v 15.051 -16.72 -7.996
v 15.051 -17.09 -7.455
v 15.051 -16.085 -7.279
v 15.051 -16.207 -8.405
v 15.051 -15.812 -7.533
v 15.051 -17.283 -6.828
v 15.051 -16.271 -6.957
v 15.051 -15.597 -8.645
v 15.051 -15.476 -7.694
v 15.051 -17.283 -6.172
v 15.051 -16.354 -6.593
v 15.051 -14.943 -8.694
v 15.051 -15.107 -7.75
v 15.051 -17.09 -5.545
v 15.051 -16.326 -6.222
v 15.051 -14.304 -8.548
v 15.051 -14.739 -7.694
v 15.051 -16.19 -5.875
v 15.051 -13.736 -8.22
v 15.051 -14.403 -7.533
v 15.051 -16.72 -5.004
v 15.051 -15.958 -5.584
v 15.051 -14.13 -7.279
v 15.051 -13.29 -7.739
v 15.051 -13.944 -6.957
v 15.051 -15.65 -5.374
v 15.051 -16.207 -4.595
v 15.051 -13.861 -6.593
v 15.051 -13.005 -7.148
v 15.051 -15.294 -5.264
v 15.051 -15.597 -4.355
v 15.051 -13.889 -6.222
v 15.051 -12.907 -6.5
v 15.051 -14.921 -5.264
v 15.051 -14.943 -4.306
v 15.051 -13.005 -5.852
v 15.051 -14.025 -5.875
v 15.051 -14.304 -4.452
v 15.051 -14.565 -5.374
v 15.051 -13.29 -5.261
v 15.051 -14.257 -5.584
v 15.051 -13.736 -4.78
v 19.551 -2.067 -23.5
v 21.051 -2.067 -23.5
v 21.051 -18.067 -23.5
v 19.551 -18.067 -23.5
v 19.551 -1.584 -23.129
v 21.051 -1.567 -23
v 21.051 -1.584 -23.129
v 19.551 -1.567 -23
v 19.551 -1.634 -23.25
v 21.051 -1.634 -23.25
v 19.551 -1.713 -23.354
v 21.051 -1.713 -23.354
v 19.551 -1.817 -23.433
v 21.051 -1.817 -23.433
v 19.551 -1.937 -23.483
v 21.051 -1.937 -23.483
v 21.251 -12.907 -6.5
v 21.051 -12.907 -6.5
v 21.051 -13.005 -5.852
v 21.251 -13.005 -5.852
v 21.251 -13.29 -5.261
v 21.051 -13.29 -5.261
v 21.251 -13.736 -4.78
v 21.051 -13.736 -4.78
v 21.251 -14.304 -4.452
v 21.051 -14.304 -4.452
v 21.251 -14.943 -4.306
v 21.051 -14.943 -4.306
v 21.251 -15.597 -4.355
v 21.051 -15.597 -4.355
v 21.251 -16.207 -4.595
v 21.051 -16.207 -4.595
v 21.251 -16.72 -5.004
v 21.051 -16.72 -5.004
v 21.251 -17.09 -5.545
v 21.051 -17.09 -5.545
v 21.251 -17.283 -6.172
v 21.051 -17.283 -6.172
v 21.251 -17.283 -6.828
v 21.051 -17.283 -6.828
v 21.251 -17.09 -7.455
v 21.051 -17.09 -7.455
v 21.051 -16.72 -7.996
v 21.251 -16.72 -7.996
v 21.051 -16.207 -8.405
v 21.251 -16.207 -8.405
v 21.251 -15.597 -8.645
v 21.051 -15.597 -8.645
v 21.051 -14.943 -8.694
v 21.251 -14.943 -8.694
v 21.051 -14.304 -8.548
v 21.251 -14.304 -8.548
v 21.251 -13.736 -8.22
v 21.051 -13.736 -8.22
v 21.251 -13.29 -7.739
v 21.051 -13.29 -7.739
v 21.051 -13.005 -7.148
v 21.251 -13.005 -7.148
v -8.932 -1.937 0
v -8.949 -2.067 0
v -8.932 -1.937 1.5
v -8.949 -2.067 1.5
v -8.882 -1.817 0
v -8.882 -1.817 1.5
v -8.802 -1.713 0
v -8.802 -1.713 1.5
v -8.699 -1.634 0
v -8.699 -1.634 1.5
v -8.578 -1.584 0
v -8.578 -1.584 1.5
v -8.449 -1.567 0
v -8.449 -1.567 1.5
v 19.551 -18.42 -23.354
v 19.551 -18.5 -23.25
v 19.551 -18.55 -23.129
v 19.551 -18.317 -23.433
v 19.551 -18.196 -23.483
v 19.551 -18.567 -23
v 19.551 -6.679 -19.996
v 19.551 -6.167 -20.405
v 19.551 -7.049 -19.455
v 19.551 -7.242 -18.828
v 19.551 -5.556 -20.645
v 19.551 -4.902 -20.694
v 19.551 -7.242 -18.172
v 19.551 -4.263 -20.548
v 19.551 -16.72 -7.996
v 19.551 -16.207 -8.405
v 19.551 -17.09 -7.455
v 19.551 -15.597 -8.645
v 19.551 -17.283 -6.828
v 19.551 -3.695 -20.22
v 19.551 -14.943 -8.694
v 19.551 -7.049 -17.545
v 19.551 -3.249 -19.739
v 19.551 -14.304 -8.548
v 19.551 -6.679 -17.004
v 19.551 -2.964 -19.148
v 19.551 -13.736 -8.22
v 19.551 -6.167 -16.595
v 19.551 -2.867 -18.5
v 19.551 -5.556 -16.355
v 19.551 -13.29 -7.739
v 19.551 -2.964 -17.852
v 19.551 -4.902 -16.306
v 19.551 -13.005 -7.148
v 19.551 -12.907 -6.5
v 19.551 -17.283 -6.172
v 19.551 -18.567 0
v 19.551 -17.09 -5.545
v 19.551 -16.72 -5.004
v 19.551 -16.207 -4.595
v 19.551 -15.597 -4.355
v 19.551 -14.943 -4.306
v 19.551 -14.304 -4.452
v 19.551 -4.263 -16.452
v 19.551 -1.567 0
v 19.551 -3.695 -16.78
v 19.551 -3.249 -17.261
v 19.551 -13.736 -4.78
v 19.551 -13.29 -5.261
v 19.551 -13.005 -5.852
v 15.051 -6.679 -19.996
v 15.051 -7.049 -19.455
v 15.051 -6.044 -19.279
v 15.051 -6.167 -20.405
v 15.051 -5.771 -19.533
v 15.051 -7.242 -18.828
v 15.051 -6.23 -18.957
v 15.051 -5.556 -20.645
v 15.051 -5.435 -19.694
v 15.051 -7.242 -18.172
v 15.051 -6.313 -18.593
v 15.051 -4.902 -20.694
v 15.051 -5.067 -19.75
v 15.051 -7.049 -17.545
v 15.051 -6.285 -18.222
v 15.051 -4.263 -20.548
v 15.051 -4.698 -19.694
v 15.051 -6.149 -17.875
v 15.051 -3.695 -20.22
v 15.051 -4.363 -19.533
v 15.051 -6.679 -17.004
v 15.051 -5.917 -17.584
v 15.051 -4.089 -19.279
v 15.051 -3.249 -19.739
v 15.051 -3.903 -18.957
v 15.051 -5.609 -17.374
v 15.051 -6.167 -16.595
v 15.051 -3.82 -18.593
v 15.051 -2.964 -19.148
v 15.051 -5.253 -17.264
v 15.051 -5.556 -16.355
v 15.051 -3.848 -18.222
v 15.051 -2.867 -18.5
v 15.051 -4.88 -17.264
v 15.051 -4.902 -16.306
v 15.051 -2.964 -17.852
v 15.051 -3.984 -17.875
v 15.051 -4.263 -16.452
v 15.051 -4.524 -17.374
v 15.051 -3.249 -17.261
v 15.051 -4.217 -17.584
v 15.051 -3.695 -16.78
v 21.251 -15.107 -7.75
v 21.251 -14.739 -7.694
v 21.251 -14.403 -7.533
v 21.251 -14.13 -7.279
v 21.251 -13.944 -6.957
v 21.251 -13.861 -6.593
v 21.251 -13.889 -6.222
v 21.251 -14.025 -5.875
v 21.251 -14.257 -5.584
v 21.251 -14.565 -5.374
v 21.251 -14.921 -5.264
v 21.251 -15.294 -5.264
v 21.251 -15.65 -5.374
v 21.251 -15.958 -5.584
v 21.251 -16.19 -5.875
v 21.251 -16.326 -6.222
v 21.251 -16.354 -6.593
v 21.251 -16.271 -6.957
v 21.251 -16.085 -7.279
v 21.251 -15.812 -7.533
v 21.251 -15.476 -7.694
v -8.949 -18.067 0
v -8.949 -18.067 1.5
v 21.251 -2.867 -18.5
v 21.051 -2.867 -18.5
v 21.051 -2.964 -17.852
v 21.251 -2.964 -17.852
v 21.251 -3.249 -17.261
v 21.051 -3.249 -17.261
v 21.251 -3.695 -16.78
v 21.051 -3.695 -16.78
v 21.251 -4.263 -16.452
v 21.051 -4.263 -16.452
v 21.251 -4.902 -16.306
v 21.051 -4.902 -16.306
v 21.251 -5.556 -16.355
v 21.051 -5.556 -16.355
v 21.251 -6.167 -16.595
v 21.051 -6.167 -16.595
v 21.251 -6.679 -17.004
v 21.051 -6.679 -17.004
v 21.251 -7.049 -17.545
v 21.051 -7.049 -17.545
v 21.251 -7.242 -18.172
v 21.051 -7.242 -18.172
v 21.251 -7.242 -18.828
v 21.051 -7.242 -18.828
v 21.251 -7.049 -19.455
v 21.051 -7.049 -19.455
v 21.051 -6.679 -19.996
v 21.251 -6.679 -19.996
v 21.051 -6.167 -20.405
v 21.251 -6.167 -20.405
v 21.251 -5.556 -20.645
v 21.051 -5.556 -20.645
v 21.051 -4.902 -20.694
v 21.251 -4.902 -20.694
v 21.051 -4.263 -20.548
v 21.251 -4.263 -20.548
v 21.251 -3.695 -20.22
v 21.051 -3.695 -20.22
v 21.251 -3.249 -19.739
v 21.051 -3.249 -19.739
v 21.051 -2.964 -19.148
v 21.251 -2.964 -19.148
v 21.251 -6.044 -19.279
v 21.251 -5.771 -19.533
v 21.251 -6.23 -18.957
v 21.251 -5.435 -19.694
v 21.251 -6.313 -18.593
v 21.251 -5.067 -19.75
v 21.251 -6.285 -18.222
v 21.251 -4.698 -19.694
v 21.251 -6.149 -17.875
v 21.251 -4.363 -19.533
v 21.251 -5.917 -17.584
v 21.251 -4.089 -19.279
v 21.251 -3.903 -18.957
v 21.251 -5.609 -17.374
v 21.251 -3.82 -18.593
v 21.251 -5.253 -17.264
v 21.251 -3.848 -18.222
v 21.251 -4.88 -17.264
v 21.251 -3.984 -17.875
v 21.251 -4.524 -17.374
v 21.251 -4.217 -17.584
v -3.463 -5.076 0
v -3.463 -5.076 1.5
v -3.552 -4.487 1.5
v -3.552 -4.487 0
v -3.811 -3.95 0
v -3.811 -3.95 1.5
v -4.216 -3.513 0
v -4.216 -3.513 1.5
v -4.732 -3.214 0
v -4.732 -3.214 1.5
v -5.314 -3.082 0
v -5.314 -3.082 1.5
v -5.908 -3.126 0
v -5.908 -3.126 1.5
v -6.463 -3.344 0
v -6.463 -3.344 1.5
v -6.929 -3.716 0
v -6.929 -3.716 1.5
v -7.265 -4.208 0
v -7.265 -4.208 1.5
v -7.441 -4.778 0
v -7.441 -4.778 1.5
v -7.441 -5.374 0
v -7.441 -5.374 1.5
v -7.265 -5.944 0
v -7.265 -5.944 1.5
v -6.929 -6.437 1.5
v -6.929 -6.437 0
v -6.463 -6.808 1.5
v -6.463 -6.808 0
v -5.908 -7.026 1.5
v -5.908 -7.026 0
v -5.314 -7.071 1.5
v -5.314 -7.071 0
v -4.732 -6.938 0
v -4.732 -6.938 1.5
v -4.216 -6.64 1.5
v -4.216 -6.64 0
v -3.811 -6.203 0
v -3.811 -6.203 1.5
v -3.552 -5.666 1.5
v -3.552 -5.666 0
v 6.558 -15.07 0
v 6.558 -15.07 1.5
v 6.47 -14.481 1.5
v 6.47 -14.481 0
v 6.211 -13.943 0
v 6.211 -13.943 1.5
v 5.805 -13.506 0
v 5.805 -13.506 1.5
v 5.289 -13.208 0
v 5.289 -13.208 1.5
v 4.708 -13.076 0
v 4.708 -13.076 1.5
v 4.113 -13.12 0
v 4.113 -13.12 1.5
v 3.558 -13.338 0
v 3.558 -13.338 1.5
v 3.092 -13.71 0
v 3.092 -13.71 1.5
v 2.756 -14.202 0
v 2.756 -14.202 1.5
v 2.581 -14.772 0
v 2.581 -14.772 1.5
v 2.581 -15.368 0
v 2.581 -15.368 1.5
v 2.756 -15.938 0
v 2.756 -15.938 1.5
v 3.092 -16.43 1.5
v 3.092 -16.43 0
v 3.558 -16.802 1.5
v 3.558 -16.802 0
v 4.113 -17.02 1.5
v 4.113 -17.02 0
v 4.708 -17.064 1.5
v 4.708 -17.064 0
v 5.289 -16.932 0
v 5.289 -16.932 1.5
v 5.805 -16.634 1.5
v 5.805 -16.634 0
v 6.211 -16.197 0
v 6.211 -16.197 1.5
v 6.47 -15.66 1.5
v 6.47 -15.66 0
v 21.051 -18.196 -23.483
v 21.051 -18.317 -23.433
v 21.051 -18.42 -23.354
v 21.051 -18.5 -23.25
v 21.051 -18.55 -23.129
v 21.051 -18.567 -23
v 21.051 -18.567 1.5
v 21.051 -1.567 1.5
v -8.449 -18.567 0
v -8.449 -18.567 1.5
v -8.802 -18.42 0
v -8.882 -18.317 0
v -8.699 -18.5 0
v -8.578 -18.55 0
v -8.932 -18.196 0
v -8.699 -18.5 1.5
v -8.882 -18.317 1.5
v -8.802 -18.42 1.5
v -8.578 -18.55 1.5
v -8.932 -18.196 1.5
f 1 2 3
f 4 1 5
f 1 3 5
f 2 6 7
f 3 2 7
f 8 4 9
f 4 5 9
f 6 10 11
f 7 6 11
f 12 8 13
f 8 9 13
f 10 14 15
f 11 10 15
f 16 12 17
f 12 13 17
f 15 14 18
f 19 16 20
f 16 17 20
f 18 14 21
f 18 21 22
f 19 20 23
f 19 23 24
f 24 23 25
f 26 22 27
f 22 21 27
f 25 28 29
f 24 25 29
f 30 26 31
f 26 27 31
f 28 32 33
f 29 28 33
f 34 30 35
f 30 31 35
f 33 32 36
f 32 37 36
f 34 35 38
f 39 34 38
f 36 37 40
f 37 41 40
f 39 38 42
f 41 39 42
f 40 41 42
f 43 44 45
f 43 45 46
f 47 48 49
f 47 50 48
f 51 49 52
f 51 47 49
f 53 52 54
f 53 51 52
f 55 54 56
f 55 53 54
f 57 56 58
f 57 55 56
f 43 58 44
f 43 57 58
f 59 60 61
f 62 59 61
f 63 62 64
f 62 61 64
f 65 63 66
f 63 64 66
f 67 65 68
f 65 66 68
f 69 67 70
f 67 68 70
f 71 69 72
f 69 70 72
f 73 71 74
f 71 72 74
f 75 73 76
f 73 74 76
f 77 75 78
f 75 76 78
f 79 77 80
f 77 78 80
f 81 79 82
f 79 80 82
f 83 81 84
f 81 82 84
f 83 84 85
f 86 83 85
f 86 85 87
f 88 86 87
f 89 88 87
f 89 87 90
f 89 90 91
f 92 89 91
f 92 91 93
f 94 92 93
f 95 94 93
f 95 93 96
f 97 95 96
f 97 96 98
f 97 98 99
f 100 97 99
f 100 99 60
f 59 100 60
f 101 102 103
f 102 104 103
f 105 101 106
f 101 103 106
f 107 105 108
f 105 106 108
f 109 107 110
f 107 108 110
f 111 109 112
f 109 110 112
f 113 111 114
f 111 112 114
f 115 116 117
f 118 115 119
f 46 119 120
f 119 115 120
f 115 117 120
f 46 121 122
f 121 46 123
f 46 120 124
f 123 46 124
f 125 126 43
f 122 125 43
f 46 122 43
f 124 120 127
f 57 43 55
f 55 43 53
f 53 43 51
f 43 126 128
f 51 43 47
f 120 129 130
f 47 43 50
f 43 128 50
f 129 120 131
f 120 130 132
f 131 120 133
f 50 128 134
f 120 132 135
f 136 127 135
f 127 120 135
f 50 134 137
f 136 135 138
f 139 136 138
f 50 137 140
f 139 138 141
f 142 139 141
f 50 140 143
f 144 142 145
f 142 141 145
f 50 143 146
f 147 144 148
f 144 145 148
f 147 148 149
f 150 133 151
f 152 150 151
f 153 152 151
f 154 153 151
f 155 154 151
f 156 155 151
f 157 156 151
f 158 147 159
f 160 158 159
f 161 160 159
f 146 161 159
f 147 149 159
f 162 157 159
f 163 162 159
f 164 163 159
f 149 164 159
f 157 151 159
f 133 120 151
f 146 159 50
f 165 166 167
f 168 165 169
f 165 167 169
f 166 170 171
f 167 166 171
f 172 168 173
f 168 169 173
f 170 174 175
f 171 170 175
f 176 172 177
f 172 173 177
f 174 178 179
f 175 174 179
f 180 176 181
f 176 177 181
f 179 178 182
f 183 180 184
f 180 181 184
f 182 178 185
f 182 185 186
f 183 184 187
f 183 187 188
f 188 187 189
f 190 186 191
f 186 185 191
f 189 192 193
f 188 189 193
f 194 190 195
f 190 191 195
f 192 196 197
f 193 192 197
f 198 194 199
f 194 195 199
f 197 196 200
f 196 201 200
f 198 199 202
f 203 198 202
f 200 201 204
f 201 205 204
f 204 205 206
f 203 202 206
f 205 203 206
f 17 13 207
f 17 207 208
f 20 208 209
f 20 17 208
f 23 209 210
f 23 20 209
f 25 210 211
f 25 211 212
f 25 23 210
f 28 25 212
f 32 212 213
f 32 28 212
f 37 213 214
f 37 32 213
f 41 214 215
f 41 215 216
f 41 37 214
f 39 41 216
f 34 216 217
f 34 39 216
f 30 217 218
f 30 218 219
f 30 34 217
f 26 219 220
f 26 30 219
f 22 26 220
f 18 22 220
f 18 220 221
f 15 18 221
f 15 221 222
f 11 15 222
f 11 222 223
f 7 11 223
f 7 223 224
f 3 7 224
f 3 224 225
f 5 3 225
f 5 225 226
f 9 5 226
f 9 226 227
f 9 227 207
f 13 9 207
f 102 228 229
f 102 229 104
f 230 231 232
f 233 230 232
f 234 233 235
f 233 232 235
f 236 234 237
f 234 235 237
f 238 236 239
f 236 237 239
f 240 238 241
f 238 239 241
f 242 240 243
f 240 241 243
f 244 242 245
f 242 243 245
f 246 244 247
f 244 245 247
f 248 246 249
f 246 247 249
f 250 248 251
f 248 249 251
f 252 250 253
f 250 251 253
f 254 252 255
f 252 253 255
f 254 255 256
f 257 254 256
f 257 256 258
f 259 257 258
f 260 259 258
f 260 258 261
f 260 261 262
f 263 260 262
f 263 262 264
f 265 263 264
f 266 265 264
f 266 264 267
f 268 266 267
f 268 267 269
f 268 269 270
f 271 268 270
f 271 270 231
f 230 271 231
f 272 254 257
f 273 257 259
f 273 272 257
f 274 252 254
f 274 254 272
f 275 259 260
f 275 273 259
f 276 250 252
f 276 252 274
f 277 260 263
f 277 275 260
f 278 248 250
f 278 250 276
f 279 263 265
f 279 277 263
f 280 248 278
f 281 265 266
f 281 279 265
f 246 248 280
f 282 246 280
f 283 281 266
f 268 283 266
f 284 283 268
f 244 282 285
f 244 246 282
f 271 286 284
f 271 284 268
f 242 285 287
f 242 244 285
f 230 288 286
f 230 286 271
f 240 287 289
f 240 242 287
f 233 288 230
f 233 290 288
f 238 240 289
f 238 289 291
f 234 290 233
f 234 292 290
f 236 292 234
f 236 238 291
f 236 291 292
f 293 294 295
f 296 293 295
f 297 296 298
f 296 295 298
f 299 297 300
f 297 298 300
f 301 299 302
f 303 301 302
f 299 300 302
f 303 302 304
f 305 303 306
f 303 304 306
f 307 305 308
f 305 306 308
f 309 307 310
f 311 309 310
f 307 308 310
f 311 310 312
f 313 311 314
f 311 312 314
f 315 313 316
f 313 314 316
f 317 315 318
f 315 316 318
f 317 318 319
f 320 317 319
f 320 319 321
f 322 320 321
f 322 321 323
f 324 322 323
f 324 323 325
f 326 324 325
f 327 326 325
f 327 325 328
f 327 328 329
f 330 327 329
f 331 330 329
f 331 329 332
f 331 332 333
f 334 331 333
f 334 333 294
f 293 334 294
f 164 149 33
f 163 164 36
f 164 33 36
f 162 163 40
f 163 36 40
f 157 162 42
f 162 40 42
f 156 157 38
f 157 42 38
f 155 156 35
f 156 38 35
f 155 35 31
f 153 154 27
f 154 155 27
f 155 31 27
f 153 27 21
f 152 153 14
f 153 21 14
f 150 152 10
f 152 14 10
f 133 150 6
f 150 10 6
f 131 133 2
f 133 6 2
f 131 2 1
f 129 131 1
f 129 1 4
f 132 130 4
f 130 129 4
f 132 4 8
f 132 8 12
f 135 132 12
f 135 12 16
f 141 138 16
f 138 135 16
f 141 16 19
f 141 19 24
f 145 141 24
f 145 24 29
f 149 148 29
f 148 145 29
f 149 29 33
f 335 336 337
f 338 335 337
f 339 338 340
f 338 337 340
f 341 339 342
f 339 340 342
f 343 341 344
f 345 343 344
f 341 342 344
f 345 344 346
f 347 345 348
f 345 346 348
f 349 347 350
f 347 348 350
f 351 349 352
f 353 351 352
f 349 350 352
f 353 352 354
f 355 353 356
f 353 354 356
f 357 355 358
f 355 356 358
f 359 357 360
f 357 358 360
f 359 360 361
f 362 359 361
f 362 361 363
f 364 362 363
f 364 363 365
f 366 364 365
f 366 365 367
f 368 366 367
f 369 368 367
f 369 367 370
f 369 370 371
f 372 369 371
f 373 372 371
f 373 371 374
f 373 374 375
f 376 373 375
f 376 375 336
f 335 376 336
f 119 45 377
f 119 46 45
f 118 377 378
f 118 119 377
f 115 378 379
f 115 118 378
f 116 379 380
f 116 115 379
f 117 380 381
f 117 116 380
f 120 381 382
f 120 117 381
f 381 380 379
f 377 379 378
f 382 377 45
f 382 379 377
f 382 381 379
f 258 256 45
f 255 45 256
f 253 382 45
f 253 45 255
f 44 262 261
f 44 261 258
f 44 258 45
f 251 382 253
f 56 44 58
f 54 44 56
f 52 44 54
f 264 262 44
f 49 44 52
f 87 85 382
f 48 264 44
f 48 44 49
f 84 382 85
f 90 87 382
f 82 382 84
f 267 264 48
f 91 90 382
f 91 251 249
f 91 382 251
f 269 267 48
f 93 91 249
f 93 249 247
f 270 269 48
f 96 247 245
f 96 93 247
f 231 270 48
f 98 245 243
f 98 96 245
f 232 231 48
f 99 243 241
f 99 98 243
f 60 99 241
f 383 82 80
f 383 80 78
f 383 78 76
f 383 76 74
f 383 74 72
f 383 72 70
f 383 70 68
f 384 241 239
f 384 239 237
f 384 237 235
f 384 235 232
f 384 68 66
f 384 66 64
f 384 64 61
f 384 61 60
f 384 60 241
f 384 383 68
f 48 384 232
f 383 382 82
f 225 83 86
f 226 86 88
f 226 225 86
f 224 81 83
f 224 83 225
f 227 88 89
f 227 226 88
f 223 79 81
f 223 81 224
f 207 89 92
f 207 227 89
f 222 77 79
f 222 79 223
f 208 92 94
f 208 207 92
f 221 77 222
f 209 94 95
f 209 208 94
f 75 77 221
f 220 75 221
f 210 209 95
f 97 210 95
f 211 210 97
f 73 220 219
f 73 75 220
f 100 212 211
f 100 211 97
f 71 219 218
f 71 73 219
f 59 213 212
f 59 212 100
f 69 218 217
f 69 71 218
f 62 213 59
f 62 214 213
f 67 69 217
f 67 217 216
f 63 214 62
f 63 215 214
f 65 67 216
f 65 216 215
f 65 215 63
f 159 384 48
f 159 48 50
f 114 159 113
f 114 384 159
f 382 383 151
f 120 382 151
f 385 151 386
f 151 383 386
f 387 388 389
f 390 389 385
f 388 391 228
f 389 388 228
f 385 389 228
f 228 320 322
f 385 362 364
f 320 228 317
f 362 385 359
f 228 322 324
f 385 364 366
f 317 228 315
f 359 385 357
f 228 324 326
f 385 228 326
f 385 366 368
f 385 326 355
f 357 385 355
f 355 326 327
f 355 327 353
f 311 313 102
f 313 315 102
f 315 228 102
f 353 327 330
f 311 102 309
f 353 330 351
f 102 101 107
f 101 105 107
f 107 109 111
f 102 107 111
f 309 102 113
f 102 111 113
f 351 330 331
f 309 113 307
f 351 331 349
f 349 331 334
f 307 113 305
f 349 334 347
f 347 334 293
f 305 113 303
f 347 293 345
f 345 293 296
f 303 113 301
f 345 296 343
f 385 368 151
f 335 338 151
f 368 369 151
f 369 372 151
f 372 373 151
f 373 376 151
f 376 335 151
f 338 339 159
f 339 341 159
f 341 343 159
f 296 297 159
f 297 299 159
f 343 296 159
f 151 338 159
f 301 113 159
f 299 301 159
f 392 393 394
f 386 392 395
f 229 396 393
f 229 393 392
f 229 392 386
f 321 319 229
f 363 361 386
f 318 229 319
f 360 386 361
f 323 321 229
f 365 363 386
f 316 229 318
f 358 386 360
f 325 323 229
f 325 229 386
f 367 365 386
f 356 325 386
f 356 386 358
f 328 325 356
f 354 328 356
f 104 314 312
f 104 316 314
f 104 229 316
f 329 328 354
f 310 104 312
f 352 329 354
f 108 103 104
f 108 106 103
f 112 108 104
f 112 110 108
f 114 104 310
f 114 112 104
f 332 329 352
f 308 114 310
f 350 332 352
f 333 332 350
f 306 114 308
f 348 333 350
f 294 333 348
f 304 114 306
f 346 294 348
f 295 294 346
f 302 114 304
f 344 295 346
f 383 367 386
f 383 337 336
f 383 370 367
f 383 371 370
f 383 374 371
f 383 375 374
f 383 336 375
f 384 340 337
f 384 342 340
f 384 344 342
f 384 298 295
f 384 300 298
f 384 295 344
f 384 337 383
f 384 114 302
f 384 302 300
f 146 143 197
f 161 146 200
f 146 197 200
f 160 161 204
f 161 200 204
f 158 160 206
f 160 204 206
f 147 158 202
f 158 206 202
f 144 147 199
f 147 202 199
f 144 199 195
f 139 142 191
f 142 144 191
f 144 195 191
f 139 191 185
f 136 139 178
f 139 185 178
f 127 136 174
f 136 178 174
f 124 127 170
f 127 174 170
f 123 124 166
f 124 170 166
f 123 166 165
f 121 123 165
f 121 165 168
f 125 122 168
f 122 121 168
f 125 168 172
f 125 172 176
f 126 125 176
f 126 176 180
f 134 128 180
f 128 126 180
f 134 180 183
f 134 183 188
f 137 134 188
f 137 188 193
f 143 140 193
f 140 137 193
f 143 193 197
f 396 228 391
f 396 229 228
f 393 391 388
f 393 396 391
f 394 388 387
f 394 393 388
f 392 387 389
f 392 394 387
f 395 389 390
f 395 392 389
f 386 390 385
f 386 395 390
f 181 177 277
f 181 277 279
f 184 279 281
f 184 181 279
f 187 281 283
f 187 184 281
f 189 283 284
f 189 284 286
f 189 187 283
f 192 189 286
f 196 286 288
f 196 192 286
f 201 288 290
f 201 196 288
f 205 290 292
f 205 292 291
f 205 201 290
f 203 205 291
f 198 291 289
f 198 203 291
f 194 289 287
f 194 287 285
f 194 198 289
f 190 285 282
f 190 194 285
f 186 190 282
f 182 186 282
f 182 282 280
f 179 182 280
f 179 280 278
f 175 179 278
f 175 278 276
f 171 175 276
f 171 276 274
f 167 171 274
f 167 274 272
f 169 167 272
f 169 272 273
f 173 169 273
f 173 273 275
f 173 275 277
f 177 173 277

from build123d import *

# Parameters (mm, degrees)
ESQUISSE1_W             = 30
ESQUISSE1_H             = 17
EXTRUSION1_DEPTH        = 1.5
ESQUISSE2_R             = 2
ENL_V_MAT_EXTRU_1_DEPTH = 2
ESQUISSE3_W             = 1.5
ESQUISSE3_H             = 17
EXTRUSION2_DEPTH        = 23.5
ESQUISSE4_R             = 1.25
ENL_V_MAT_EXTRU_2_DEPTH = 2
EXTRUSION3_DEPTH        = 0.2
EXTRUSION3_DEPTH_BACK   = 6
ESQUISSE5_R             = 2.2
ESQUISSE5_R_2           = 1.25
CONG_1_R                = 0.5


with BuildPart() as part:
    # Esquisse1 → Extrusion1 (new body)
    with BuildSketch(Plane.XY):
        with Locations((6.051065449, -10.06674277)):
            Rectangle(ESQUISSE1_W, ESQUISSE1_H)
    extrude(amount=EXTRUSION1_DEPTH)

    # Esquisse2 → Enlèv. mat.-Extru.1 (cut)
    with BuildSketch(Plane.XY.offset(1.5)):
        with Locations((-5.463077382, -5.076163116)):
            Circle(ESQUISSE2_R)
        with Locations((4.558431294, -15.07006433)):
            Circle(ESQUISSE2_R)
    extrude(amount=-ENL_V_MAT_EXTRU_1_DEPTH, mode=Mode.SUBTRACT)

    # Esquisse3 → Extrusion2 (add)
    with BuildSketch(Plane(origin=(0, 0, 0), x_dir=(-1, 0, 0), z_dir=(0, 0, -1))):
        with Locations((-20.301065449, -10.06674277)):
            Rectangle(ESQUISSE3_W, ESQUISSE3_H)
    extrude(amount=EXTRUSION2_DEPTH)

    # Esquisse4 → Enlèv. mat.-Extru.2 (cut)
    with BuildSketch(Plane(origin=(21.051065449, 0, 0), x_dir=(0, 0, -1), z_dir=(1, 0, 0))):
        with Locations((6.5, -15.107440586)):
            Circle(ESQUISSE4_R)
        with Locations((18.5, -5.06674277)):
            Circle(ESQUISSE4_R)
    extrude(amount=-ENL_V_MAT_EXTRU_2_DEPTH, mode=Mode.SUBTRACT)

    # Esquisse5 → Extrusion3 (add, two sides: drawn at the far end of the back side and taken through both)
    # profile 1 of 2: a face of its own
    with BuildSketch(Plane(origin=(21.051065449, 0, 0), x_dir=(0, 0, -1), z_dir=(1, 0, 0)).offset(-EXTRUSION3_DEPTH_BACK)):
        with Locations(Location((6.5, -15.107440586, 0), (0, 0, 90))):
            Circle(ESQUISSE5_R)
        with Locations((6.5, -15.107440586)):
            Circle(ESQUISSE5_R_2, mode=Mode.SUBTRACT)
    # profile 2 of 2: a face of its own
    with BuildSketch(Plane(origin=(21.051065449, 0, 0), x_dir=(0, 0, -1), z_dir=(1, 0, 0)).offset(-EXTRUSION3_DEPTH_BACK)):
        with Locations(Location((18.5, -5.06674277, 0), (0, 0, 90))):
            Circle(ESQUISSE5_R)
        with Locations((18.5, -5.06674277)):
            Circle(ESQUISSE5_R_2, mode=Mode.SUBTRACT)
    extrude(amount=EXTRUSION3_DEPTH + EXTRUSION3_DEPTH_BACK)

    # Congé1
    cong_1_edges = [part.edges().sort_by_distance(p)[0] for p in [
        (20.301065449, -18.56674277, -23.5),
        (20.301065449, -1.56674277, -23.5),
        (-8.948934551, -18.56674277, 0.75),
        (-8.948934551, -1.56674277, 0.75),
    ]]
    fillet(cong_1_edges, radius=CONG_1_R)


solid = part.part
